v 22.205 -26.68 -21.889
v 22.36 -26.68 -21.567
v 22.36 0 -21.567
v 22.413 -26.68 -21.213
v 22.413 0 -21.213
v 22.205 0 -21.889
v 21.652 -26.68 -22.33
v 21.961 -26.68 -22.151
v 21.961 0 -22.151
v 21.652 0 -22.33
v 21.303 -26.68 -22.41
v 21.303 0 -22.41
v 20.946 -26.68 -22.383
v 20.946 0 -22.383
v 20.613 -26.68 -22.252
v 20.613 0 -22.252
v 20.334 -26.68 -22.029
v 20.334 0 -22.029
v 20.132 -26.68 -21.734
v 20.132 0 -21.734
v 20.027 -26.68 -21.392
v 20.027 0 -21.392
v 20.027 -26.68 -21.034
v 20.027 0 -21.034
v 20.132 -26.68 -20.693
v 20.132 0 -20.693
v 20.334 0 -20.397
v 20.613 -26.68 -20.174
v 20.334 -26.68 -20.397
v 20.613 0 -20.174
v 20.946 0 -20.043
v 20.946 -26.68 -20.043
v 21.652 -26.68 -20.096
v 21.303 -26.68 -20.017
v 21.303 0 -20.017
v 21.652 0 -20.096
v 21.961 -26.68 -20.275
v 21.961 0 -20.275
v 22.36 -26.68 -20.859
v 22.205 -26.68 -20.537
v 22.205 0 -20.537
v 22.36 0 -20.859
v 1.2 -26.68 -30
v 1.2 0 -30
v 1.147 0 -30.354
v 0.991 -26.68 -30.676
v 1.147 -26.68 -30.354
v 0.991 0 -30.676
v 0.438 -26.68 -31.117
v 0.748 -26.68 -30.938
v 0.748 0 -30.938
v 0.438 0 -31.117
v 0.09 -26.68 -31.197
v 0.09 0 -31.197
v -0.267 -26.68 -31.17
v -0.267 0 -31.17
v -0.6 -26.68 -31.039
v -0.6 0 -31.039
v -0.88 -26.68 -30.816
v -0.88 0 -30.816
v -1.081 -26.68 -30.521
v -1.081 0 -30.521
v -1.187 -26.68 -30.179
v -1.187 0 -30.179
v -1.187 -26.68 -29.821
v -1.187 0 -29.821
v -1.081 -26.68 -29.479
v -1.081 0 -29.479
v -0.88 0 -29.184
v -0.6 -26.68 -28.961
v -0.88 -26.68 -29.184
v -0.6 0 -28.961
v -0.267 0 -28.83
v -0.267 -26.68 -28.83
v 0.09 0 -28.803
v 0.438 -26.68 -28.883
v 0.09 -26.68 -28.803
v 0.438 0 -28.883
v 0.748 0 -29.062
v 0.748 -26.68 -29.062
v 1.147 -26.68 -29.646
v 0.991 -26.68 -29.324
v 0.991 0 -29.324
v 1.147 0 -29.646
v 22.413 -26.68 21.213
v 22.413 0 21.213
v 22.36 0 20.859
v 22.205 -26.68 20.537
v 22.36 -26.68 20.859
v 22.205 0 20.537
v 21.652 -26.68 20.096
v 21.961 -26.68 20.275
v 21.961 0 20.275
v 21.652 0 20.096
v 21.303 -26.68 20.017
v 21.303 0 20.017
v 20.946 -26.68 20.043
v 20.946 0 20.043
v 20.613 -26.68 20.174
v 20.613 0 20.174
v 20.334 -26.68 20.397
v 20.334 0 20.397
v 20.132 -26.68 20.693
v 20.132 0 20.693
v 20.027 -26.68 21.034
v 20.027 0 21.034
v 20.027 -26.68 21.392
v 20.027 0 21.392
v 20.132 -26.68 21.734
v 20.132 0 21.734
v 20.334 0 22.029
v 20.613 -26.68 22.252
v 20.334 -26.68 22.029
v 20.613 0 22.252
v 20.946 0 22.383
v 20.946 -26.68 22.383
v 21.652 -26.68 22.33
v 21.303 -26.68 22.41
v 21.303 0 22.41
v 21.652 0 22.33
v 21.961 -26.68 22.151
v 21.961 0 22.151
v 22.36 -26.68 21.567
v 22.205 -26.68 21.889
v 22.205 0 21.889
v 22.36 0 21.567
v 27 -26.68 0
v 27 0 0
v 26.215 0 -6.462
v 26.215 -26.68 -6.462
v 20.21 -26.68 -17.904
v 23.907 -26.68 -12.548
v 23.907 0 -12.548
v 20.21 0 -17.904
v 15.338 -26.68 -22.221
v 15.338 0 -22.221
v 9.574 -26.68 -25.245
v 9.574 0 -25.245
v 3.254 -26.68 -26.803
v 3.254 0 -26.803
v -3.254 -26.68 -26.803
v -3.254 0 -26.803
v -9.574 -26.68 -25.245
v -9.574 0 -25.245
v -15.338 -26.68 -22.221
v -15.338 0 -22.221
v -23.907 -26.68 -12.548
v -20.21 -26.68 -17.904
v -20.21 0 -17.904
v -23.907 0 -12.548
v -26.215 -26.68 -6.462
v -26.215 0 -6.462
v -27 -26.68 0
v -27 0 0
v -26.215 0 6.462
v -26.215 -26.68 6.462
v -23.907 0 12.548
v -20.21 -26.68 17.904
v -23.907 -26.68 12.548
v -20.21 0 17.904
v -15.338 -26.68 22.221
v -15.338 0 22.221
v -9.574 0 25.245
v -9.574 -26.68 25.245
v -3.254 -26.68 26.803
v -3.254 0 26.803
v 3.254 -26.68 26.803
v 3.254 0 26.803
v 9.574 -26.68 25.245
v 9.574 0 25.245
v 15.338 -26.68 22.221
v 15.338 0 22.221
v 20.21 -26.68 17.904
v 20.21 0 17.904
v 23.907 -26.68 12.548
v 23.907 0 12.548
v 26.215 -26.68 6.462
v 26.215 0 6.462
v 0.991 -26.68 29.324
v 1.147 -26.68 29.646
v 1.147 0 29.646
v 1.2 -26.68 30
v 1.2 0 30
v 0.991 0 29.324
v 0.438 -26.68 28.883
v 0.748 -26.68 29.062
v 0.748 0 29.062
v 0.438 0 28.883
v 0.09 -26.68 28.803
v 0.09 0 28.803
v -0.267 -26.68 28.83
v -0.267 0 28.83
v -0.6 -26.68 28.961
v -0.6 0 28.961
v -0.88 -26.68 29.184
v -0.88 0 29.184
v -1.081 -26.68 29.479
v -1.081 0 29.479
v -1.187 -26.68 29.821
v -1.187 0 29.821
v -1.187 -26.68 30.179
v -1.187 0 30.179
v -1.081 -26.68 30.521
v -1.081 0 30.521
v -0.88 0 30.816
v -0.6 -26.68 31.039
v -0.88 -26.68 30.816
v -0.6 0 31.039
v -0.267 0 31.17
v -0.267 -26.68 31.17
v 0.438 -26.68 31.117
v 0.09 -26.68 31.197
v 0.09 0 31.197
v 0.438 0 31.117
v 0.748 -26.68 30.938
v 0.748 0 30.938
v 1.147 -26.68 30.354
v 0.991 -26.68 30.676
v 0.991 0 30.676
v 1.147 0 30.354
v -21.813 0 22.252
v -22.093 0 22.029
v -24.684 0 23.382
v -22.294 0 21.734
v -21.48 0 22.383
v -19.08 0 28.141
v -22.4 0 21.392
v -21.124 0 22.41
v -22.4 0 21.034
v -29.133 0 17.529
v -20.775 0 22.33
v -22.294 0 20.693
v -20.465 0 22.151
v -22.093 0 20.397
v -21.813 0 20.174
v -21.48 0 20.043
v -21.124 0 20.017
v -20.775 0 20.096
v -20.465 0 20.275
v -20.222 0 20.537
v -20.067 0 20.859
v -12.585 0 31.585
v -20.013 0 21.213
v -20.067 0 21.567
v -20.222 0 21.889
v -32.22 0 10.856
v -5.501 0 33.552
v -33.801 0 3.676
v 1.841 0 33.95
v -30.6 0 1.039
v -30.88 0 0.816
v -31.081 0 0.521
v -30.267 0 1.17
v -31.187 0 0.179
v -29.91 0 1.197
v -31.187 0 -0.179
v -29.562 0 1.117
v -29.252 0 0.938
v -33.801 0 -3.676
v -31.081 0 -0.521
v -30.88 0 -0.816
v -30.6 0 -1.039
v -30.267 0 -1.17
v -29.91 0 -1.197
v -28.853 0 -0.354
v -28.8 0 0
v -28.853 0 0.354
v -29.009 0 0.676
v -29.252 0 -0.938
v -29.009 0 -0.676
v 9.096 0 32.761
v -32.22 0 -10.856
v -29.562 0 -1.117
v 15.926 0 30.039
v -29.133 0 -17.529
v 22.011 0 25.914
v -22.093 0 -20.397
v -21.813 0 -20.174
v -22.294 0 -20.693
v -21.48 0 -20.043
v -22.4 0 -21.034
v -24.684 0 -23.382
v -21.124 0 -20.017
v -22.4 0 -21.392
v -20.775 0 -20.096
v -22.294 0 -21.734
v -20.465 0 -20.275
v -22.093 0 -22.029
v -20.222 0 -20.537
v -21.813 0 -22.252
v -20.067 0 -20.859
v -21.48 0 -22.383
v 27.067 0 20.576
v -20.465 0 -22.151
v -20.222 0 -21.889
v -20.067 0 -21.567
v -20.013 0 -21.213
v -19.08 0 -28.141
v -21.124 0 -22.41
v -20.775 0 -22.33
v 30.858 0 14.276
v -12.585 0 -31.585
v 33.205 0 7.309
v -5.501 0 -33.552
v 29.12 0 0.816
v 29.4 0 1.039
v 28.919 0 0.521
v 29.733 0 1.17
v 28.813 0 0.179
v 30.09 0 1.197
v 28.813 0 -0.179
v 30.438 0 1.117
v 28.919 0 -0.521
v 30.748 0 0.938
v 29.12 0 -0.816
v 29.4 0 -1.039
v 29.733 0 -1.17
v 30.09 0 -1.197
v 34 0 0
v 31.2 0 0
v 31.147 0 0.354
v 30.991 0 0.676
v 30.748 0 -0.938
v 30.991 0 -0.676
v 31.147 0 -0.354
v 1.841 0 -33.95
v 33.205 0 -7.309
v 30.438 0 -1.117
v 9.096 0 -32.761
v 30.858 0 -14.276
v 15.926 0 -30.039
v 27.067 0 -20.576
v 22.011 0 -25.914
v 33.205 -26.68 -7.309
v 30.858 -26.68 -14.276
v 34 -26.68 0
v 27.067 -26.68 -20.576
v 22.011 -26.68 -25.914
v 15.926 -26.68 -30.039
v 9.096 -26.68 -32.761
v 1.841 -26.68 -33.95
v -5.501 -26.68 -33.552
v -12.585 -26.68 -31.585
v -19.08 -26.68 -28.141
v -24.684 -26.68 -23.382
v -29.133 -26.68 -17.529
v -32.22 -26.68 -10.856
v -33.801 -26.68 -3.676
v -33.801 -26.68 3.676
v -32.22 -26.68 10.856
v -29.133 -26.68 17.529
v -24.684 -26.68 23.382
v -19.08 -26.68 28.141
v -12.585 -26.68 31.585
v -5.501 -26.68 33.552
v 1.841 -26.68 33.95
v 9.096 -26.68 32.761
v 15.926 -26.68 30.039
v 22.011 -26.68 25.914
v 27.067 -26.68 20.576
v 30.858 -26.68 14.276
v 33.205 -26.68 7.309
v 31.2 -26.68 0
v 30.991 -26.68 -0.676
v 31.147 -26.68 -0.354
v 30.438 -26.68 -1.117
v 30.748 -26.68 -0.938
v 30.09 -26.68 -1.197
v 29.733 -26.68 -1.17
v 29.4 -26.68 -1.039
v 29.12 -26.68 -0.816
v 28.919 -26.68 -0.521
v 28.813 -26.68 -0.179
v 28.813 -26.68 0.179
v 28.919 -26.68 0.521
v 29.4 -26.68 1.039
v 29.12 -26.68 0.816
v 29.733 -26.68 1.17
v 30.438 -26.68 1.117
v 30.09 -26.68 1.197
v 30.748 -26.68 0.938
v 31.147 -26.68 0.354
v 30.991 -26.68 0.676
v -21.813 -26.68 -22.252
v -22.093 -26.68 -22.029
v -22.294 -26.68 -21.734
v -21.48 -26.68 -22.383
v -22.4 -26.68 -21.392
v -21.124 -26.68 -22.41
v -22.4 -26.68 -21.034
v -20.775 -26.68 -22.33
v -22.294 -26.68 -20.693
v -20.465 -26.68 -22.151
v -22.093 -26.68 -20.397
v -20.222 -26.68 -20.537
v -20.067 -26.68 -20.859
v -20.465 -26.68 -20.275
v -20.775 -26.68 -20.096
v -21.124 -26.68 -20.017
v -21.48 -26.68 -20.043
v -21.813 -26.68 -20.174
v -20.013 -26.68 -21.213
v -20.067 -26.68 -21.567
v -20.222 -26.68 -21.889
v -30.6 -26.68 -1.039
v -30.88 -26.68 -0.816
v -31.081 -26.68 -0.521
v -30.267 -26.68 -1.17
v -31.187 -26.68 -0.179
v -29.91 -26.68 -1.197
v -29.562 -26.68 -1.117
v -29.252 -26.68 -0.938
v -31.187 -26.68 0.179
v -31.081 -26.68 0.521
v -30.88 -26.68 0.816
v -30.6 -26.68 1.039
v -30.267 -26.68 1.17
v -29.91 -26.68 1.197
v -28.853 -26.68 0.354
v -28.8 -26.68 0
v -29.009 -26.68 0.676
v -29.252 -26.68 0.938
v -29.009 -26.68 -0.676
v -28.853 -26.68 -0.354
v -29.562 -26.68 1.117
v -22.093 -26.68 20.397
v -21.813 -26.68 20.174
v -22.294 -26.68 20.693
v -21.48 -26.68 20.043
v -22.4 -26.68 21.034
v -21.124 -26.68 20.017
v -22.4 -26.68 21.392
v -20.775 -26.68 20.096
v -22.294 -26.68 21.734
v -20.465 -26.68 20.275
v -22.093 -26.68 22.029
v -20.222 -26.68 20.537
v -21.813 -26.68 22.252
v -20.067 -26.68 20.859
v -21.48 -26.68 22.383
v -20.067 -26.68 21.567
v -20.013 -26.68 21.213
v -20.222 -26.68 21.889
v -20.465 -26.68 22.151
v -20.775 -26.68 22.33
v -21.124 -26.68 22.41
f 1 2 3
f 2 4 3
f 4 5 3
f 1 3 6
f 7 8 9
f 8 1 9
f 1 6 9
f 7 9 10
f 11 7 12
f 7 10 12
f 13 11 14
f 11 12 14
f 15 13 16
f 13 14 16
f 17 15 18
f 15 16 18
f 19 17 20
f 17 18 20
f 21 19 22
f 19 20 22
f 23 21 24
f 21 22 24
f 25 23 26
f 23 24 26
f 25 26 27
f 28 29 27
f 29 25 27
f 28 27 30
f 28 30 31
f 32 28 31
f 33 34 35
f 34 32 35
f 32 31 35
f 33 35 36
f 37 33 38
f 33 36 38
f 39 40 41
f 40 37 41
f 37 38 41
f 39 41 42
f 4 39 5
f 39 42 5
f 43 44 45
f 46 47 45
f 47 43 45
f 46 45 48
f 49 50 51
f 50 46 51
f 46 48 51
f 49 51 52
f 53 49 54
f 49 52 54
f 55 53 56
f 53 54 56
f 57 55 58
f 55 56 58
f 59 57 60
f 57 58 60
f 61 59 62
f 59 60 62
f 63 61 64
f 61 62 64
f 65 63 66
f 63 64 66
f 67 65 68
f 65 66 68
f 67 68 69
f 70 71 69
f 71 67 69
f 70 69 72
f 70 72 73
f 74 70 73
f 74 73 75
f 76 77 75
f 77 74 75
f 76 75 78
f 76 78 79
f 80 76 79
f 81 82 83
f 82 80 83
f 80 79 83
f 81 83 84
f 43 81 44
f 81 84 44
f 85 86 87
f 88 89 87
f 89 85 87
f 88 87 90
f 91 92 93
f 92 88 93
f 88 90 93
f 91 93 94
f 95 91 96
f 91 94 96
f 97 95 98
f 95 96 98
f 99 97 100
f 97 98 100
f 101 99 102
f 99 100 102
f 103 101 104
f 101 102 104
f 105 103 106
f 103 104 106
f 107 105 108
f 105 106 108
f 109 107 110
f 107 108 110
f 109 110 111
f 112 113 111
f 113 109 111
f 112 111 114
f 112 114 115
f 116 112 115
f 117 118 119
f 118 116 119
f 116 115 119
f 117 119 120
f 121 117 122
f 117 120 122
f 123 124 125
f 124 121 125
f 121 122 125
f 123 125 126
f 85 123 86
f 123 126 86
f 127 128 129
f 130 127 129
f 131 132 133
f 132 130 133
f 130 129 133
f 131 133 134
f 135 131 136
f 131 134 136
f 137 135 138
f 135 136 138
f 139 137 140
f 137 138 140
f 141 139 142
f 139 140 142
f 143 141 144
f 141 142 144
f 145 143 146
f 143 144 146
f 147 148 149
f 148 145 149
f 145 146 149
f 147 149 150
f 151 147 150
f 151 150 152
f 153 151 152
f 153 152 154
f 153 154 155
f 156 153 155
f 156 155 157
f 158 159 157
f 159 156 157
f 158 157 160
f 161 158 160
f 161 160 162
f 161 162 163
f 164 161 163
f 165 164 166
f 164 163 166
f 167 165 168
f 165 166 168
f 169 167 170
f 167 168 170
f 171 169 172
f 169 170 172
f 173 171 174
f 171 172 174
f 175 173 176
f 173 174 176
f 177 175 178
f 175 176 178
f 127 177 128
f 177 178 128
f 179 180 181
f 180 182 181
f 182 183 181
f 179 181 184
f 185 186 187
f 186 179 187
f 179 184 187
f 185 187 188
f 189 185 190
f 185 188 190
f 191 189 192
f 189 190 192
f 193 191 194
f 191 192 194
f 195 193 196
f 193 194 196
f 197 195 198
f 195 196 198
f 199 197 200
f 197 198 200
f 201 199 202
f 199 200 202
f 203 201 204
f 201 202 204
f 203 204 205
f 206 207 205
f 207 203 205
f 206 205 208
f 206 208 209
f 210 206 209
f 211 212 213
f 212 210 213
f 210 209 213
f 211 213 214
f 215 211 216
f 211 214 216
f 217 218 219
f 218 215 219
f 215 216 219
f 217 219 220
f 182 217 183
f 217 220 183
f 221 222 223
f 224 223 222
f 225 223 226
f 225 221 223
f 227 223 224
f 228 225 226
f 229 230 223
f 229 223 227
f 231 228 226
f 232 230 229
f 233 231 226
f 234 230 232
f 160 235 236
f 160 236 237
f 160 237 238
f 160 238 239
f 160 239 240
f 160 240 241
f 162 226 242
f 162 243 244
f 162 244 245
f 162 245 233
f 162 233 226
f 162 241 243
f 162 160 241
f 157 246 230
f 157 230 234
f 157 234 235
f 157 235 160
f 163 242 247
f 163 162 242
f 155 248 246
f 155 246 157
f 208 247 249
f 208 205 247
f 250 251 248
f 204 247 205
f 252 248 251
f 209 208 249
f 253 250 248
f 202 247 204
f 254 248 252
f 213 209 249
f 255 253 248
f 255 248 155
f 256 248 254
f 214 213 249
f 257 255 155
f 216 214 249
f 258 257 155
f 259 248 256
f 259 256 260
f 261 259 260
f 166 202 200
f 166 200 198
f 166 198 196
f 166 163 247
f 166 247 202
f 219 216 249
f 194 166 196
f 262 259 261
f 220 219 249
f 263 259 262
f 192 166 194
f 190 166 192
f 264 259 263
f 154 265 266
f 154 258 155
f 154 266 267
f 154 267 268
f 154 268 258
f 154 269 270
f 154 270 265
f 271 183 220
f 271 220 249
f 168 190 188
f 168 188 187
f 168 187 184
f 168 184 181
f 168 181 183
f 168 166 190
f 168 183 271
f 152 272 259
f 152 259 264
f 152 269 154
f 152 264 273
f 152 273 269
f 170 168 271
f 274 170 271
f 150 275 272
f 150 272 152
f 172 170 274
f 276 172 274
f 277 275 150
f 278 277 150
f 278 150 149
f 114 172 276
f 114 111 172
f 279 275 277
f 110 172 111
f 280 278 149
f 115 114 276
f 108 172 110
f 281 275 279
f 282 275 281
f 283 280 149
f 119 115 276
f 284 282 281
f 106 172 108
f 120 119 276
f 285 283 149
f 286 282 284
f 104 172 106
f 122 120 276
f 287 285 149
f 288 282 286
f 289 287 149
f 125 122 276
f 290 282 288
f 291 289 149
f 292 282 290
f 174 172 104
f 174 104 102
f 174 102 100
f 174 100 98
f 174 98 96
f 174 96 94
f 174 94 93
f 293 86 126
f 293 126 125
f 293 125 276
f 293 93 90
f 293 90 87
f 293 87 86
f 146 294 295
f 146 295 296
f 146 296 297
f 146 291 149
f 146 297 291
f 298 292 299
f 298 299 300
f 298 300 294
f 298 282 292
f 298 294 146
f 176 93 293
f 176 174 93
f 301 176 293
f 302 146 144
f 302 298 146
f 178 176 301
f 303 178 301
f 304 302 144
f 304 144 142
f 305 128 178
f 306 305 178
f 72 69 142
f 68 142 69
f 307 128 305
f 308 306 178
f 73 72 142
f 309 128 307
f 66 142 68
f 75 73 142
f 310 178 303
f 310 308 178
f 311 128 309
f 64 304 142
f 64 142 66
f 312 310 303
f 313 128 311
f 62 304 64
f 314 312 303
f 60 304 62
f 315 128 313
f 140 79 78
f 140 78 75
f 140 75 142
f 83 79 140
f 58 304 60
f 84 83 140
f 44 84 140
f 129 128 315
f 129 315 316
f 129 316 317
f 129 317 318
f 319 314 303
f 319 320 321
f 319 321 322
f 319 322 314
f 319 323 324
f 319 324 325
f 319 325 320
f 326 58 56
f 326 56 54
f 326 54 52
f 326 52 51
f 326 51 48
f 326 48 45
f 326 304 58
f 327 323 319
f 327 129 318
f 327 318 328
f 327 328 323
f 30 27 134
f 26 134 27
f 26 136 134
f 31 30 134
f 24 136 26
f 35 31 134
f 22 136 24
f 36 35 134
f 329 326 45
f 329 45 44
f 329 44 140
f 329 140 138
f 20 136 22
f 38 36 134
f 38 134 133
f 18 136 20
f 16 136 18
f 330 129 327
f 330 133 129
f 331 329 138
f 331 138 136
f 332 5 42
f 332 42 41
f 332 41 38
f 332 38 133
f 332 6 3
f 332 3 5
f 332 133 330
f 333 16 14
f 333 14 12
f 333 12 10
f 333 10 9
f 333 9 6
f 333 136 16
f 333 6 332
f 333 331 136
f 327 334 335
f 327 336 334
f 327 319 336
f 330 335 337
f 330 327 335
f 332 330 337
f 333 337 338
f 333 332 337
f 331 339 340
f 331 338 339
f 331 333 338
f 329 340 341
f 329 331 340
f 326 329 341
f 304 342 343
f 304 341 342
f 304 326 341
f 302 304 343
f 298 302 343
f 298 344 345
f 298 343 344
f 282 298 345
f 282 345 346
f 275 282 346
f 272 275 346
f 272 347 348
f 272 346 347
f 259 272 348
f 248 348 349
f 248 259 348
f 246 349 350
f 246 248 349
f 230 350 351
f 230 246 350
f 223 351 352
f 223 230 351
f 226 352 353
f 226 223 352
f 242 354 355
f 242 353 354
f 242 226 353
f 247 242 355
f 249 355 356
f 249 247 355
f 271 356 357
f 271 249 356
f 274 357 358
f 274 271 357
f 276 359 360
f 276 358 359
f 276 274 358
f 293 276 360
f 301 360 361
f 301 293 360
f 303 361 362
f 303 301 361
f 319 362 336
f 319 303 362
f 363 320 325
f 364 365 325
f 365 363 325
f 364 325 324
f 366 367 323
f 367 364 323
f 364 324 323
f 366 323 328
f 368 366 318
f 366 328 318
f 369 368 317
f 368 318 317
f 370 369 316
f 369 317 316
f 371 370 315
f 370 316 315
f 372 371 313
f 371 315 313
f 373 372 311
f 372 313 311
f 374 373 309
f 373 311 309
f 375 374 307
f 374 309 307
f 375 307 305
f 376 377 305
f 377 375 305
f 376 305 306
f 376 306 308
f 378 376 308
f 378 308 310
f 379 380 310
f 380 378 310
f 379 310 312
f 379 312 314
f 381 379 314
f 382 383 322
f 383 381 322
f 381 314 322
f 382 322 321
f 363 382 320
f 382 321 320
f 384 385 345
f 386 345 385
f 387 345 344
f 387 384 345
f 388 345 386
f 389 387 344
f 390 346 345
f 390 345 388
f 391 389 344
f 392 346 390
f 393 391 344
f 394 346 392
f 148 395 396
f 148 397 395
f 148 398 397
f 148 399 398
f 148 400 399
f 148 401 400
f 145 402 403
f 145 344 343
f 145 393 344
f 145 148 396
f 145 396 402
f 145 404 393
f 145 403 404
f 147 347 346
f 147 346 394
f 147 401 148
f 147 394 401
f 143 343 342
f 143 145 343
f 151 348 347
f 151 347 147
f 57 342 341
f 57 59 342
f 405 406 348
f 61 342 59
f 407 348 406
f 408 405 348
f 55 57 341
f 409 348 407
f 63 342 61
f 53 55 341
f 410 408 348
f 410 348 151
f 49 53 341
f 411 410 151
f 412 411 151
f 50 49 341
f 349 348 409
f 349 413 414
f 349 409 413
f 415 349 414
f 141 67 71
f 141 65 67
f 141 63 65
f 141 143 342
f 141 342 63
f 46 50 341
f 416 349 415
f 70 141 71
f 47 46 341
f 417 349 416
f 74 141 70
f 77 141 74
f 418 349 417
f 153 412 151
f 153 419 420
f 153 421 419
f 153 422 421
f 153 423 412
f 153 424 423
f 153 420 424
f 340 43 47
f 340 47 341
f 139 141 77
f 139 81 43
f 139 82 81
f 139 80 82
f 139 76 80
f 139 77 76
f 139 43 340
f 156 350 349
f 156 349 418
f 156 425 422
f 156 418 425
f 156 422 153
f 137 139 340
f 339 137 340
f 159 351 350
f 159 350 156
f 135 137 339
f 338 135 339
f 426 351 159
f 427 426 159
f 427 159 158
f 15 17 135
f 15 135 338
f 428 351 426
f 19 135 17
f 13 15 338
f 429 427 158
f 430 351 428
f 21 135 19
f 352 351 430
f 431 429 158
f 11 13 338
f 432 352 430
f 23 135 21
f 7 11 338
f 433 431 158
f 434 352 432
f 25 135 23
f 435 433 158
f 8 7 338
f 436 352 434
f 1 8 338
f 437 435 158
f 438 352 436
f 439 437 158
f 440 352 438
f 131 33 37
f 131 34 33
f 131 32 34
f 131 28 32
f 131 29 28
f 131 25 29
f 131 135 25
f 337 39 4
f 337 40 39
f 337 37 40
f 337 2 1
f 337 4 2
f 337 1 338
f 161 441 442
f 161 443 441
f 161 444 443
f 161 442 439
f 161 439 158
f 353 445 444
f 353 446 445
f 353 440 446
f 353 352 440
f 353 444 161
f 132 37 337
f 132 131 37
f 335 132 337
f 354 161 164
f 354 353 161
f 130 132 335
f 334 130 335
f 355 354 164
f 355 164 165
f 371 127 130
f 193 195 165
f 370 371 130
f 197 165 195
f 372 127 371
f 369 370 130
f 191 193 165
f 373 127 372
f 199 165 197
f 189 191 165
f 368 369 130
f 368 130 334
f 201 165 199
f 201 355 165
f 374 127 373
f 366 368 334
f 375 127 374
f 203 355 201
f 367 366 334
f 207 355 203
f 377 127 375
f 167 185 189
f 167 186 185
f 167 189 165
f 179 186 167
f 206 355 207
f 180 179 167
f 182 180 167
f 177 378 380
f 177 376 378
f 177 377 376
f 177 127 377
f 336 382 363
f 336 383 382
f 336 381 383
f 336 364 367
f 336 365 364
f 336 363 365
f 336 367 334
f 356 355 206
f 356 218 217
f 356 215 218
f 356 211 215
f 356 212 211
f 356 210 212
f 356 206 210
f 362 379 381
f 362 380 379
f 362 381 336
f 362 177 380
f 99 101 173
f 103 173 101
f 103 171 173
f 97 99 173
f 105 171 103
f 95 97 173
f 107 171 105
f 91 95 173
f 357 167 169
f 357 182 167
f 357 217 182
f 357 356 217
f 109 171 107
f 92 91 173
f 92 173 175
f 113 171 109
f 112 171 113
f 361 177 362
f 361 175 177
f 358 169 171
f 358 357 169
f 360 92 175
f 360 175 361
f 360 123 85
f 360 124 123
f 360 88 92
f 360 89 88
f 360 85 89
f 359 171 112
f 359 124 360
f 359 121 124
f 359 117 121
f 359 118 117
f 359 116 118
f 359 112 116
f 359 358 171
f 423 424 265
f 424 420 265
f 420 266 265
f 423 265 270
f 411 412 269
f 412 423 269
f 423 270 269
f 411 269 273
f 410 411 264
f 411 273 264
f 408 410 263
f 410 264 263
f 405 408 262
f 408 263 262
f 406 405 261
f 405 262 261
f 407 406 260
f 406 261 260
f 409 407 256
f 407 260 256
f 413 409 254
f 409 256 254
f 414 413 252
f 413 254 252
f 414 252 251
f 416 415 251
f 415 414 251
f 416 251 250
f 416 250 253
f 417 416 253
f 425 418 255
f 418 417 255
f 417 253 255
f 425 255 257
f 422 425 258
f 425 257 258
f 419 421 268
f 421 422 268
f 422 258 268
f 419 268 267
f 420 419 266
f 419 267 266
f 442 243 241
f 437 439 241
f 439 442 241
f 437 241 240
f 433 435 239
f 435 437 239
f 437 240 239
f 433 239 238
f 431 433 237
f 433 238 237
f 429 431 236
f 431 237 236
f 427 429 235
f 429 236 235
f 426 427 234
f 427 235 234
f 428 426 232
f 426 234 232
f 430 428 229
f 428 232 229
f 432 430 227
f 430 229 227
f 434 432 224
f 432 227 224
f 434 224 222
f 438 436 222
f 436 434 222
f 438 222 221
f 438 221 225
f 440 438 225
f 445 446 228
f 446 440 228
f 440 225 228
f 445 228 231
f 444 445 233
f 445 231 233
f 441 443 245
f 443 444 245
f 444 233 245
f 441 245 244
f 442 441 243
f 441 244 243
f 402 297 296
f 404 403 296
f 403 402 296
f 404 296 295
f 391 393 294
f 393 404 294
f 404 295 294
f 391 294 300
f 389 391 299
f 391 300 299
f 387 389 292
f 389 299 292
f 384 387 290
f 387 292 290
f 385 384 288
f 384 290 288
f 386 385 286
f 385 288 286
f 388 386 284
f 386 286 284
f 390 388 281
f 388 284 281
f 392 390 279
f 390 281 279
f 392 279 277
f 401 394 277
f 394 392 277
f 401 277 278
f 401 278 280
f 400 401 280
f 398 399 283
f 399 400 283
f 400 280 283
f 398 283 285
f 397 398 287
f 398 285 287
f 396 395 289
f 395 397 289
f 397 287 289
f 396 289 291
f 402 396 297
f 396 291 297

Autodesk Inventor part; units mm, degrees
ref_plane "YZ Plane" through (0, 0, 0) normal (1, 0, 0) x (0, 1, 0)
ref_plane "XZ Plane" through (0, 0, 0) normal (0, 1, 0) x (-1, 0, 0)
ref_plane "XY Plane" through (0, 0, 0) normal (0, 0, 1) x (1, 0, 0)
sketch "Sketch1" plane through (0, 0, 0) normal (0, 1, 0) x (-1, 0, 0)
  circle A0 centre (0, 0) radius 34
  circle A1 centre (9.5, 0) radius 1.6
  circle A2 centre (4.75, 8.2272) radius 1.6
  circle A3 centre (-4.75, 8.2272) radius 1.6
  circle A4 centre (-9.5, 0) radius 1.6
  circle A5 centre (-4.75, -8.2272) radius 1.6
  circle A6 centre (4.75, -8.2272) radius 1.6
  circle A7 centre (30, 0) radius 1.2
  circle A8 centre (21.2132, 21.2132) radius 1.2
  circle A9 centre (0, 30) radius 1.2
  circle A10 centre (-21.2132, 21.2132) radius 1.2
  circle A11 centre (-30, 0) radius 1.2
  circle A12 centre (-21.2132, -21.2132) radius 1.2
  circle A13 centre (0, -30) radius 1.2
  circle A14 centre (21.2132, -21.2132) radius 1.2
  dimension "d0" = 68
  dimension "d1" = 3.2
  dimension "d2" = 9.5
  dimension "d3" = 0
  dimension "d6" = 360
  dimension "d10" = 2.4
  dimension "d11" = 0
  dimension "d12" = 30
  dimension "d15" = 360
extrude "Extrusion3" add sketch "Sketch1" along normal blind 5
sketch "Sketch5" plane through (0, 0, 0) normal (0, -1, 0) x (1, 0, 0)
  circle A0 centre (0, 0) radius 34 projected
  circle A1 centre (21.2132, 21.2132) radius 1.2 projected
  circle A2 centre (30, 0) radius 1.2 projected
  circle A3 centre (21.2132, -21.2132) radius 1.2 projected
  circle A4 centre (0, -30) radius 1.2 projected
  circle A5 centre (-21.2132, -21.2132) radius 1.2 projected
  circle A6 centre (-30, 0) radius 1.2 projected
  circle A7 centre (-21.2132, 21.2132) radius 1.2 projected
  circle A8 centre (0, 30) radius 1.2 projected
  circle A9 centre (0, 0) radius 27
  circle A10 centre (21.2132, 21.2132) radius 1.2
  circle A11 centre (30, 0) radius 1.2
  circle A12 centre (21.2132, -21.2132) radius 1.2
  circle A13 centre (0, -30) radius 1.2
  circle A14 centre (-21.2132, -21.2132) radius 1.2
  circle A15 centre (-30, 0) radius 1.2
  circle A16 centre (-21.2132, 21.2132) radius 1.2
  circle A17 centre (0, 30) radius 1.2 projected
  circle A18 centre (0, 30) radius 1.225
  circle A19 centre (0, 0) radius 34
  dimension "d21" = 54
extrude "Extrusion4" add sketch "Sketch5" along normal blind 26.68 contours A0 | A18
sketch "Sketch6" plane through (0, 5, 0) normal (0, 1, 0) x (1, 0, 0)
  circle A0 centre (0, 0) radius 34
extrude "Extrusion5" cut sketch "Sketch6" against normal blind 5
properties part number "sprocketsHolder" material "ABS Plastic"
